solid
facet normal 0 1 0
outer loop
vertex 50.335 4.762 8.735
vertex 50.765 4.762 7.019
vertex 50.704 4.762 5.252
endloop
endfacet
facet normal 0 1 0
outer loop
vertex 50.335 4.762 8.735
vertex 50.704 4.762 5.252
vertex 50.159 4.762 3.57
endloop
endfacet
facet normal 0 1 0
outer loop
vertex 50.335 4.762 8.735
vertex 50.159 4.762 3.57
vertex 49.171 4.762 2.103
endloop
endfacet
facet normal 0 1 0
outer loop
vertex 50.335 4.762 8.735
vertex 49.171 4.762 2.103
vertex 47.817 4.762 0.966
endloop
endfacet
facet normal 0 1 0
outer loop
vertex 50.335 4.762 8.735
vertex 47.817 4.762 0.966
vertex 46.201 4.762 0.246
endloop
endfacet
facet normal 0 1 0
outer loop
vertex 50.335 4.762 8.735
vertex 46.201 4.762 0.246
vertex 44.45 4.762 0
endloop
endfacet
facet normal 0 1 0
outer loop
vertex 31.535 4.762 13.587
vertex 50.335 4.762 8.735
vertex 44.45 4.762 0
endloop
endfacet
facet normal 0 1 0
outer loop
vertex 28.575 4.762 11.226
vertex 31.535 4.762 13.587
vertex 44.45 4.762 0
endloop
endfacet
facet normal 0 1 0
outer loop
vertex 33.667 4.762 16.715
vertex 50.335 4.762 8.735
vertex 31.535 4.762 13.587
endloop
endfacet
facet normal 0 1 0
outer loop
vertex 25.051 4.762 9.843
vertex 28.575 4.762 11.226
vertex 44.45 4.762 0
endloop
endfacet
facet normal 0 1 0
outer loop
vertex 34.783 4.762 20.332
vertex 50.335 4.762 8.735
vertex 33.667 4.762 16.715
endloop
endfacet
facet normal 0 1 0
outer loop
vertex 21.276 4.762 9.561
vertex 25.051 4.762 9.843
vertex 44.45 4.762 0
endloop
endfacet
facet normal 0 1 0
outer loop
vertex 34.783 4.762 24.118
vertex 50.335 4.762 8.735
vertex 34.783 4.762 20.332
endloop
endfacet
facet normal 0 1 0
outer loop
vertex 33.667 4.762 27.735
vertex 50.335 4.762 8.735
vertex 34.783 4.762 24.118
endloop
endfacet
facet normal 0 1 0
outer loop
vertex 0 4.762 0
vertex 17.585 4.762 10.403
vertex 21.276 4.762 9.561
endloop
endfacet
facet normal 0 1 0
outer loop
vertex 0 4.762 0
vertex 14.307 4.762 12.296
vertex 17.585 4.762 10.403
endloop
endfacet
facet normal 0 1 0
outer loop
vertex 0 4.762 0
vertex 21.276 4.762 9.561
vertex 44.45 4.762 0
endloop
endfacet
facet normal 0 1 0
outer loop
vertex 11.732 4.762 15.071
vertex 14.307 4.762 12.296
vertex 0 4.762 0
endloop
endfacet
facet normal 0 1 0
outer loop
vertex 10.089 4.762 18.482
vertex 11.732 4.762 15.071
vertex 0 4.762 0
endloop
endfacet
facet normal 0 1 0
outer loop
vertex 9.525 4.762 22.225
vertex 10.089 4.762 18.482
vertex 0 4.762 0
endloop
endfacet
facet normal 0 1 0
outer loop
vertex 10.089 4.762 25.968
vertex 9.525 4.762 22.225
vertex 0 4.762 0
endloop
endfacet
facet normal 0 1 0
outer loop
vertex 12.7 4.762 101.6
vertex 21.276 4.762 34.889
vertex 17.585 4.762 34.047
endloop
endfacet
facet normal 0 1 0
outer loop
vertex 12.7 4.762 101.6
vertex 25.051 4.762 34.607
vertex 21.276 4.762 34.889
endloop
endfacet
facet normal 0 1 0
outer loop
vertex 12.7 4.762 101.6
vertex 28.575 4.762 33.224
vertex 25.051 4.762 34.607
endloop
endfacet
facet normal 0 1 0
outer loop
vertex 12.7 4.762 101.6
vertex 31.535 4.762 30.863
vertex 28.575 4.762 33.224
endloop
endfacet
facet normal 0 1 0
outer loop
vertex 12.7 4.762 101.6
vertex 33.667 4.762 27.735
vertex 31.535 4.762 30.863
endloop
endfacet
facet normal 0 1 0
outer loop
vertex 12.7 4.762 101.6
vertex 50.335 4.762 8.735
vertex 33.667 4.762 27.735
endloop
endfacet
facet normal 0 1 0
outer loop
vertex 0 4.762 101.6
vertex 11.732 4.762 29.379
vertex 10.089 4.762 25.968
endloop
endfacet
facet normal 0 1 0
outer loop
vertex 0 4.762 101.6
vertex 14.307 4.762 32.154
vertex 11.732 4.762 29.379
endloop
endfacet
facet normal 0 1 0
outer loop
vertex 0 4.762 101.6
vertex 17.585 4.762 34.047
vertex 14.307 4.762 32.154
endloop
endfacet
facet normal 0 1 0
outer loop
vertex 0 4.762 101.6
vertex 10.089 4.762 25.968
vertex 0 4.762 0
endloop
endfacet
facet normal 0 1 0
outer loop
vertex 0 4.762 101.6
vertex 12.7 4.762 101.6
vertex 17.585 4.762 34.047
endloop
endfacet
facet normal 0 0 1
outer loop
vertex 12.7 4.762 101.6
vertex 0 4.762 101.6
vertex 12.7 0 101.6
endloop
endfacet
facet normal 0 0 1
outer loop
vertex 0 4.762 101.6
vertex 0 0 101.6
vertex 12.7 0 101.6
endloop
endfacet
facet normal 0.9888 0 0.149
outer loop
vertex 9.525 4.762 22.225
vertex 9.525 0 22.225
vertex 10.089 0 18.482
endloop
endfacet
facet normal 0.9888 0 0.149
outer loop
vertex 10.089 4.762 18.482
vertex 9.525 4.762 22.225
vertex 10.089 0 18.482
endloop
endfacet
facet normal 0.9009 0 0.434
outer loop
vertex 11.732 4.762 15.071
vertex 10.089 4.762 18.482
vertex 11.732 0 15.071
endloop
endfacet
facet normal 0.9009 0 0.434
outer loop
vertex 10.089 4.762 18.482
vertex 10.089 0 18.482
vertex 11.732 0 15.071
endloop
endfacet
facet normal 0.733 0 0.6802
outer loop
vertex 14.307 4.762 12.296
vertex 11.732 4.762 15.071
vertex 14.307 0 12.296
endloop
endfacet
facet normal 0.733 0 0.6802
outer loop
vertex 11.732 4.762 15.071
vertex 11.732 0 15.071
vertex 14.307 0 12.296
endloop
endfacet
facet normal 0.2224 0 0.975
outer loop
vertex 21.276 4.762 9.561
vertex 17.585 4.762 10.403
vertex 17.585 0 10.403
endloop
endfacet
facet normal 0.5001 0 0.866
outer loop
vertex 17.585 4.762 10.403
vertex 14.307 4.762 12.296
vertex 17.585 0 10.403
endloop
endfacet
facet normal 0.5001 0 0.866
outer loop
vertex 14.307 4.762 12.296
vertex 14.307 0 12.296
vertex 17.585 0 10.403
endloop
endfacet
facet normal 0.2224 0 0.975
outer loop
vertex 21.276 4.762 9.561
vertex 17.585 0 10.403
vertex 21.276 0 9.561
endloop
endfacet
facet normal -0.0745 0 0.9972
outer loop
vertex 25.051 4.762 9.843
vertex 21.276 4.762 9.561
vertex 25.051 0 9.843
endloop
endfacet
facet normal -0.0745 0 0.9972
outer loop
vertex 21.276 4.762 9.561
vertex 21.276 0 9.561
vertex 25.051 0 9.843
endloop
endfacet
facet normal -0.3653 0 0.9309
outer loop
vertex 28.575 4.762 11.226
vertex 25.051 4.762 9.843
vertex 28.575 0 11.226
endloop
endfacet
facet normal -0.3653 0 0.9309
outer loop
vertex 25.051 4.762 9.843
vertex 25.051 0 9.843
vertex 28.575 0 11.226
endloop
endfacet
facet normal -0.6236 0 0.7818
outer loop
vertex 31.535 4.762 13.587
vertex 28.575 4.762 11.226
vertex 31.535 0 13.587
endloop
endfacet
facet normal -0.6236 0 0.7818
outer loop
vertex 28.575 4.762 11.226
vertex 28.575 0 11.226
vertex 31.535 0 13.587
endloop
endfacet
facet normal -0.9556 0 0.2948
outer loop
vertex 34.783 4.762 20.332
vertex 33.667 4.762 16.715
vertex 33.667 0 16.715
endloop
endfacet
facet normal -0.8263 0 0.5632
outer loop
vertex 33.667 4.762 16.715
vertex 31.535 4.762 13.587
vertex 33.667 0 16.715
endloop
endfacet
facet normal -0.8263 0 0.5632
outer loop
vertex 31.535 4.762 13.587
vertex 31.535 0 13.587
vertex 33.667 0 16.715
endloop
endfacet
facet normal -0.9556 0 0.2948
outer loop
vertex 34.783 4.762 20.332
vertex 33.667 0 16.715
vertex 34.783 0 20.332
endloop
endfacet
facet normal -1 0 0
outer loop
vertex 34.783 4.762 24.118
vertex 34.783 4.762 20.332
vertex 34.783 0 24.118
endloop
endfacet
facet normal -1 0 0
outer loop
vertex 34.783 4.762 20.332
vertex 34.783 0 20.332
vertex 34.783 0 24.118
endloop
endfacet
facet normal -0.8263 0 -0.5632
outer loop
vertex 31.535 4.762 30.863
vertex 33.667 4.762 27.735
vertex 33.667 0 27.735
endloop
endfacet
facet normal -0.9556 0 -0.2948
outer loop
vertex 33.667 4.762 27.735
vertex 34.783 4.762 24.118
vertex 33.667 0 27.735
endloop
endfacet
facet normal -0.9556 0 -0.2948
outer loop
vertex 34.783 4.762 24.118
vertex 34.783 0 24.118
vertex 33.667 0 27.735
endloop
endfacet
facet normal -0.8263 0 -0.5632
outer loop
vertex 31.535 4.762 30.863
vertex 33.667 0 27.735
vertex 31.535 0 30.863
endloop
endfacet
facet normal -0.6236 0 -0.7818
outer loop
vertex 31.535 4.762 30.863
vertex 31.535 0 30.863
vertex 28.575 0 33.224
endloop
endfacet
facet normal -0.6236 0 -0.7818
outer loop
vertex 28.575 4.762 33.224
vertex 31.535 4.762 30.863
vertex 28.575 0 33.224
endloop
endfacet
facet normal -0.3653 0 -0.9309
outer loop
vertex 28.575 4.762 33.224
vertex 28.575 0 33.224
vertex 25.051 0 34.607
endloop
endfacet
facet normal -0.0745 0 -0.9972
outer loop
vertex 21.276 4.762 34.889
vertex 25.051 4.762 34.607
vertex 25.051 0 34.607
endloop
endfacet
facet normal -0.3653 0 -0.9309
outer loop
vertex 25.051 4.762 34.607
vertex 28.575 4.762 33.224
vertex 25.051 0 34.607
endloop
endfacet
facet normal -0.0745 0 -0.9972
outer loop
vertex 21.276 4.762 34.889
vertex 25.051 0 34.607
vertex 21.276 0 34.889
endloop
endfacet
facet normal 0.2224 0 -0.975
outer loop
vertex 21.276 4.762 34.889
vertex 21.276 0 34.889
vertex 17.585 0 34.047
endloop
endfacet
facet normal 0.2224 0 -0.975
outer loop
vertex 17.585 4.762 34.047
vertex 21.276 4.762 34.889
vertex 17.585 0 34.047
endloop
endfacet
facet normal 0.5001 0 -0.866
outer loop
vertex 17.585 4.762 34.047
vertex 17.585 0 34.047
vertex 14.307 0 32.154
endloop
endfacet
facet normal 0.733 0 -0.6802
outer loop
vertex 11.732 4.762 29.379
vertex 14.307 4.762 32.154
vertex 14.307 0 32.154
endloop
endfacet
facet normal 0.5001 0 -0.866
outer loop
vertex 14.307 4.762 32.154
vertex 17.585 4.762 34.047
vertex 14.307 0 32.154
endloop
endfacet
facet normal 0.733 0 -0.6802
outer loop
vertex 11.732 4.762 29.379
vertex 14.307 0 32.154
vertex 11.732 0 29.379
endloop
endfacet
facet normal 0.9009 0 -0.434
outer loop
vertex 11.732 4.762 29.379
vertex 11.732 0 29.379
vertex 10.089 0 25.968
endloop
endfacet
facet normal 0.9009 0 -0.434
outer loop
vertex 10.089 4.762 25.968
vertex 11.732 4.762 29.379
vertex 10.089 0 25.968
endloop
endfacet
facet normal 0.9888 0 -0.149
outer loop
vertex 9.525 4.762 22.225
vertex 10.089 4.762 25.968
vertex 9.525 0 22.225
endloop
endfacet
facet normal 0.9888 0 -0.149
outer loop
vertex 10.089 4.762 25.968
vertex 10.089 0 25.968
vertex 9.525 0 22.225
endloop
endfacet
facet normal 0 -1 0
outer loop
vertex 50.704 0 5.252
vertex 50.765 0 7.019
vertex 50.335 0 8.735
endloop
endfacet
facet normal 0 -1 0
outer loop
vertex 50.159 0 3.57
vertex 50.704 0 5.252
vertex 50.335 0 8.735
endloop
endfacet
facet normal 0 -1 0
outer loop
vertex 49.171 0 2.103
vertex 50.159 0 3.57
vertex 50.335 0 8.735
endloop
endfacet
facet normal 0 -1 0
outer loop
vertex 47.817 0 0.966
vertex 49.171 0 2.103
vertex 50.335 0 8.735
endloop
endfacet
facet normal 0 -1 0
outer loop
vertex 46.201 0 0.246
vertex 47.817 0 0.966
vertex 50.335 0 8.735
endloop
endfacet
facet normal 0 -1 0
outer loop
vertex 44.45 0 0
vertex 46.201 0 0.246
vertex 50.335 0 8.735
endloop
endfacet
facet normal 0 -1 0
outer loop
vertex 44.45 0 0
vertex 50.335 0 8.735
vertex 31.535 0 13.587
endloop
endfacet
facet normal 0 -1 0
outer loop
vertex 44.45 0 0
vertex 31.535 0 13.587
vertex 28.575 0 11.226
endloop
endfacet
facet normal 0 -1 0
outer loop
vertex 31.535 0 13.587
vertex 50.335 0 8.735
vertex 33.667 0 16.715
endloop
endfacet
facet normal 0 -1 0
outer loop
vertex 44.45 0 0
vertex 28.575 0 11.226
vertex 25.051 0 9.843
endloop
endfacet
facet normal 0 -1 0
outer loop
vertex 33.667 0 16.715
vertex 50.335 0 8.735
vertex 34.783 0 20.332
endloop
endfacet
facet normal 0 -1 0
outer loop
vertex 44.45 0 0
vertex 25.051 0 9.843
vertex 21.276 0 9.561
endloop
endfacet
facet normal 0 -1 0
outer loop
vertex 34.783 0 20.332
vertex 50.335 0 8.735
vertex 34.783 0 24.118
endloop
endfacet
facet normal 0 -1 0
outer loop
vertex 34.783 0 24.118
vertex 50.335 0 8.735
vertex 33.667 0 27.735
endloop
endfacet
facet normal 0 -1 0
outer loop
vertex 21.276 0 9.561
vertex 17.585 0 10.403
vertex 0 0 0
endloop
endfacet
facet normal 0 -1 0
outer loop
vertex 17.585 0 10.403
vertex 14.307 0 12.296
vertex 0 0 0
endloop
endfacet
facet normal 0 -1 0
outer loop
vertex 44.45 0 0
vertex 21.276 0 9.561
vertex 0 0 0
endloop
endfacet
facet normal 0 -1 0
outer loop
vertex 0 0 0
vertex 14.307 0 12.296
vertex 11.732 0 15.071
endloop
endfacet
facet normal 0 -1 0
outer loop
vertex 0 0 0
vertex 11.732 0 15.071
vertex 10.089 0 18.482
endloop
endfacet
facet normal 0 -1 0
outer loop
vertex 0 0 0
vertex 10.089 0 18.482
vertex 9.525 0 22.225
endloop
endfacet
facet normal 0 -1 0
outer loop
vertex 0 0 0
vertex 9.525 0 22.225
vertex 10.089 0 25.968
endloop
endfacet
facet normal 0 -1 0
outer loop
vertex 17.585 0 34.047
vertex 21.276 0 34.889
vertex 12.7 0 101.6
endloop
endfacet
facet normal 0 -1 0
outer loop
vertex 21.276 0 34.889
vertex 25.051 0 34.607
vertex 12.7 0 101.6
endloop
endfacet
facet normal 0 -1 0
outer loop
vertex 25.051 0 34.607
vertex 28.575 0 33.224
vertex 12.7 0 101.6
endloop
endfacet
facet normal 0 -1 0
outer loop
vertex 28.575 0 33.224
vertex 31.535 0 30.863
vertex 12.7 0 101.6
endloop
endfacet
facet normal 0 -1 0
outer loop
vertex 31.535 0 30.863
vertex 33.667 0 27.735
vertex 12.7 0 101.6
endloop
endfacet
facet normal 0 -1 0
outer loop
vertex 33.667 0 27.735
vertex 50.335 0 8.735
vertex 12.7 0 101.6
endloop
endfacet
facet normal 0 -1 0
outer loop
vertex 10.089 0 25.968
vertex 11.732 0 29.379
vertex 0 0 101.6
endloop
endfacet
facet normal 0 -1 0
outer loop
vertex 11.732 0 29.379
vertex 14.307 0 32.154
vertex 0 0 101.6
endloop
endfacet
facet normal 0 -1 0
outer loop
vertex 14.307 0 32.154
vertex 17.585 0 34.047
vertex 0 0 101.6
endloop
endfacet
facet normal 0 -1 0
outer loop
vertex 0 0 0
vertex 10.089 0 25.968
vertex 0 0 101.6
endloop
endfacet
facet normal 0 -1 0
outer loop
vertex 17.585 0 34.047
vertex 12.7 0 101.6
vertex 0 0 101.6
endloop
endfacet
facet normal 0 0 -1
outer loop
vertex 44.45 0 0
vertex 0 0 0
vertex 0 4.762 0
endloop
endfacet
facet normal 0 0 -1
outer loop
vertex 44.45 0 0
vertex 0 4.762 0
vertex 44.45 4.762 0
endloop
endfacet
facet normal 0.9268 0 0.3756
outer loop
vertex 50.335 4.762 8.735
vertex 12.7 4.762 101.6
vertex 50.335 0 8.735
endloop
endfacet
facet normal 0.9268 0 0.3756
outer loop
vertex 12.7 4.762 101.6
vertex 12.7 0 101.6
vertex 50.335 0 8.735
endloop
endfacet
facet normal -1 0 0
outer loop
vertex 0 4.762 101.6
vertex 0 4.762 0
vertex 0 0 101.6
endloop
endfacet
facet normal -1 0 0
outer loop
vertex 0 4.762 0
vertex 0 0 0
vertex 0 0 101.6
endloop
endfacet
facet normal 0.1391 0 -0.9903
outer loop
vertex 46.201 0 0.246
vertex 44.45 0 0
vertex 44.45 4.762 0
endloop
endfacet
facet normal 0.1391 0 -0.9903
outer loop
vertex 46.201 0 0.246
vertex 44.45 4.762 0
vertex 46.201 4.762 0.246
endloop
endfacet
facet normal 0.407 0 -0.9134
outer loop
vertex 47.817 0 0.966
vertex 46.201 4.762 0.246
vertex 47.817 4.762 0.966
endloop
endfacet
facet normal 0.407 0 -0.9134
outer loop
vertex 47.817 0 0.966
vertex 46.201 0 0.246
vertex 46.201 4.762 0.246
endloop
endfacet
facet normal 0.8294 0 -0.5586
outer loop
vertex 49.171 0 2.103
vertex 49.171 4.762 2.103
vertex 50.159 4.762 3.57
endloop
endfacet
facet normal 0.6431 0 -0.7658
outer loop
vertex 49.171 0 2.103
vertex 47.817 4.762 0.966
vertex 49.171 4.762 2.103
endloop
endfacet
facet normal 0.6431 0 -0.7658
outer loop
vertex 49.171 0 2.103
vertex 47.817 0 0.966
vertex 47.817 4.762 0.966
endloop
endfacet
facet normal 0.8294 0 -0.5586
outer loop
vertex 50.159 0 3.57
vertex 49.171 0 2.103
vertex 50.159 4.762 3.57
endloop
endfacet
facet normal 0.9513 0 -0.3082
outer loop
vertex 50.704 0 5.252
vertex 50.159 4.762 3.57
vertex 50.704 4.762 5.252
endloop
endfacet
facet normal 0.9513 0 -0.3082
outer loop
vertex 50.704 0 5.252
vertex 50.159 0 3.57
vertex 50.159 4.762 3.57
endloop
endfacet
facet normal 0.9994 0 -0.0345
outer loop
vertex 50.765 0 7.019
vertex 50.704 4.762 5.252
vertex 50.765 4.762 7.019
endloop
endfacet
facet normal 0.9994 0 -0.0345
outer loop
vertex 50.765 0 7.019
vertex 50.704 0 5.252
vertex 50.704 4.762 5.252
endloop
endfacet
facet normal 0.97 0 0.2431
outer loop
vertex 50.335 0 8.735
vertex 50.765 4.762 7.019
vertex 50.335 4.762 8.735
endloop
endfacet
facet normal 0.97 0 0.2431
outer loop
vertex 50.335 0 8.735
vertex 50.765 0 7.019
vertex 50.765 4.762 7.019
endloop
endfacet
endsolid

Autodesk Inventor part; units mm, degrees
ref_plane "YZ Plane" through (0, 0, 0) normal (1, 0, 0) x (0, 1, 0)
ref_plane "XZ Plane" through (0, 0, 0) normal (0, 1, 0) x (-1, 0, 0)
ref_plane "XY Plane" through (0, 0, 0) normal (0, 0, 1) x (1, 0, 0)
sketch "Sketch1" plane through (0, 0, 0) normal (0, 1, 0) x (-1, 0, 0)
  line L0 (0, 0) -> (0, 101.6)
  line L1 (0, 101.6) -> (-12.7, 101.6)
  line L2 (0, 0) -> (-44.45, 0)
  line L3 (-12.7, 101.6) -> (-50.3351, 8.735)
  arc A0 (-50.3351, 8.735) -> (-44.45, 0) centre (-44.45, 6.35) ccw
  line L4 (-50.8, 8.1746) -> (-50.8, -12.3493) construction
  circle A1 centre (-22.225, 22.225) radius 12.7
  point P0 (-53.8751, 0)
  dimension "d0" = 101.6
  dimension "d1" = 12.7
  dimension "d4" = 6.35
  dimension "d5" = 50.8
  dimension "d6" = 25.4
  dimension "d7" = 22.225
  dimension "d8" = 22.225
extrude "Extrusion1" add sketch "Sketch1" along normal blind 4.7625
ref_plane "WP Lug" through (0, 2.3813, 0) normal (0, 1, 0) x (1, 0, 0)
properties part number "Liftinglug"
